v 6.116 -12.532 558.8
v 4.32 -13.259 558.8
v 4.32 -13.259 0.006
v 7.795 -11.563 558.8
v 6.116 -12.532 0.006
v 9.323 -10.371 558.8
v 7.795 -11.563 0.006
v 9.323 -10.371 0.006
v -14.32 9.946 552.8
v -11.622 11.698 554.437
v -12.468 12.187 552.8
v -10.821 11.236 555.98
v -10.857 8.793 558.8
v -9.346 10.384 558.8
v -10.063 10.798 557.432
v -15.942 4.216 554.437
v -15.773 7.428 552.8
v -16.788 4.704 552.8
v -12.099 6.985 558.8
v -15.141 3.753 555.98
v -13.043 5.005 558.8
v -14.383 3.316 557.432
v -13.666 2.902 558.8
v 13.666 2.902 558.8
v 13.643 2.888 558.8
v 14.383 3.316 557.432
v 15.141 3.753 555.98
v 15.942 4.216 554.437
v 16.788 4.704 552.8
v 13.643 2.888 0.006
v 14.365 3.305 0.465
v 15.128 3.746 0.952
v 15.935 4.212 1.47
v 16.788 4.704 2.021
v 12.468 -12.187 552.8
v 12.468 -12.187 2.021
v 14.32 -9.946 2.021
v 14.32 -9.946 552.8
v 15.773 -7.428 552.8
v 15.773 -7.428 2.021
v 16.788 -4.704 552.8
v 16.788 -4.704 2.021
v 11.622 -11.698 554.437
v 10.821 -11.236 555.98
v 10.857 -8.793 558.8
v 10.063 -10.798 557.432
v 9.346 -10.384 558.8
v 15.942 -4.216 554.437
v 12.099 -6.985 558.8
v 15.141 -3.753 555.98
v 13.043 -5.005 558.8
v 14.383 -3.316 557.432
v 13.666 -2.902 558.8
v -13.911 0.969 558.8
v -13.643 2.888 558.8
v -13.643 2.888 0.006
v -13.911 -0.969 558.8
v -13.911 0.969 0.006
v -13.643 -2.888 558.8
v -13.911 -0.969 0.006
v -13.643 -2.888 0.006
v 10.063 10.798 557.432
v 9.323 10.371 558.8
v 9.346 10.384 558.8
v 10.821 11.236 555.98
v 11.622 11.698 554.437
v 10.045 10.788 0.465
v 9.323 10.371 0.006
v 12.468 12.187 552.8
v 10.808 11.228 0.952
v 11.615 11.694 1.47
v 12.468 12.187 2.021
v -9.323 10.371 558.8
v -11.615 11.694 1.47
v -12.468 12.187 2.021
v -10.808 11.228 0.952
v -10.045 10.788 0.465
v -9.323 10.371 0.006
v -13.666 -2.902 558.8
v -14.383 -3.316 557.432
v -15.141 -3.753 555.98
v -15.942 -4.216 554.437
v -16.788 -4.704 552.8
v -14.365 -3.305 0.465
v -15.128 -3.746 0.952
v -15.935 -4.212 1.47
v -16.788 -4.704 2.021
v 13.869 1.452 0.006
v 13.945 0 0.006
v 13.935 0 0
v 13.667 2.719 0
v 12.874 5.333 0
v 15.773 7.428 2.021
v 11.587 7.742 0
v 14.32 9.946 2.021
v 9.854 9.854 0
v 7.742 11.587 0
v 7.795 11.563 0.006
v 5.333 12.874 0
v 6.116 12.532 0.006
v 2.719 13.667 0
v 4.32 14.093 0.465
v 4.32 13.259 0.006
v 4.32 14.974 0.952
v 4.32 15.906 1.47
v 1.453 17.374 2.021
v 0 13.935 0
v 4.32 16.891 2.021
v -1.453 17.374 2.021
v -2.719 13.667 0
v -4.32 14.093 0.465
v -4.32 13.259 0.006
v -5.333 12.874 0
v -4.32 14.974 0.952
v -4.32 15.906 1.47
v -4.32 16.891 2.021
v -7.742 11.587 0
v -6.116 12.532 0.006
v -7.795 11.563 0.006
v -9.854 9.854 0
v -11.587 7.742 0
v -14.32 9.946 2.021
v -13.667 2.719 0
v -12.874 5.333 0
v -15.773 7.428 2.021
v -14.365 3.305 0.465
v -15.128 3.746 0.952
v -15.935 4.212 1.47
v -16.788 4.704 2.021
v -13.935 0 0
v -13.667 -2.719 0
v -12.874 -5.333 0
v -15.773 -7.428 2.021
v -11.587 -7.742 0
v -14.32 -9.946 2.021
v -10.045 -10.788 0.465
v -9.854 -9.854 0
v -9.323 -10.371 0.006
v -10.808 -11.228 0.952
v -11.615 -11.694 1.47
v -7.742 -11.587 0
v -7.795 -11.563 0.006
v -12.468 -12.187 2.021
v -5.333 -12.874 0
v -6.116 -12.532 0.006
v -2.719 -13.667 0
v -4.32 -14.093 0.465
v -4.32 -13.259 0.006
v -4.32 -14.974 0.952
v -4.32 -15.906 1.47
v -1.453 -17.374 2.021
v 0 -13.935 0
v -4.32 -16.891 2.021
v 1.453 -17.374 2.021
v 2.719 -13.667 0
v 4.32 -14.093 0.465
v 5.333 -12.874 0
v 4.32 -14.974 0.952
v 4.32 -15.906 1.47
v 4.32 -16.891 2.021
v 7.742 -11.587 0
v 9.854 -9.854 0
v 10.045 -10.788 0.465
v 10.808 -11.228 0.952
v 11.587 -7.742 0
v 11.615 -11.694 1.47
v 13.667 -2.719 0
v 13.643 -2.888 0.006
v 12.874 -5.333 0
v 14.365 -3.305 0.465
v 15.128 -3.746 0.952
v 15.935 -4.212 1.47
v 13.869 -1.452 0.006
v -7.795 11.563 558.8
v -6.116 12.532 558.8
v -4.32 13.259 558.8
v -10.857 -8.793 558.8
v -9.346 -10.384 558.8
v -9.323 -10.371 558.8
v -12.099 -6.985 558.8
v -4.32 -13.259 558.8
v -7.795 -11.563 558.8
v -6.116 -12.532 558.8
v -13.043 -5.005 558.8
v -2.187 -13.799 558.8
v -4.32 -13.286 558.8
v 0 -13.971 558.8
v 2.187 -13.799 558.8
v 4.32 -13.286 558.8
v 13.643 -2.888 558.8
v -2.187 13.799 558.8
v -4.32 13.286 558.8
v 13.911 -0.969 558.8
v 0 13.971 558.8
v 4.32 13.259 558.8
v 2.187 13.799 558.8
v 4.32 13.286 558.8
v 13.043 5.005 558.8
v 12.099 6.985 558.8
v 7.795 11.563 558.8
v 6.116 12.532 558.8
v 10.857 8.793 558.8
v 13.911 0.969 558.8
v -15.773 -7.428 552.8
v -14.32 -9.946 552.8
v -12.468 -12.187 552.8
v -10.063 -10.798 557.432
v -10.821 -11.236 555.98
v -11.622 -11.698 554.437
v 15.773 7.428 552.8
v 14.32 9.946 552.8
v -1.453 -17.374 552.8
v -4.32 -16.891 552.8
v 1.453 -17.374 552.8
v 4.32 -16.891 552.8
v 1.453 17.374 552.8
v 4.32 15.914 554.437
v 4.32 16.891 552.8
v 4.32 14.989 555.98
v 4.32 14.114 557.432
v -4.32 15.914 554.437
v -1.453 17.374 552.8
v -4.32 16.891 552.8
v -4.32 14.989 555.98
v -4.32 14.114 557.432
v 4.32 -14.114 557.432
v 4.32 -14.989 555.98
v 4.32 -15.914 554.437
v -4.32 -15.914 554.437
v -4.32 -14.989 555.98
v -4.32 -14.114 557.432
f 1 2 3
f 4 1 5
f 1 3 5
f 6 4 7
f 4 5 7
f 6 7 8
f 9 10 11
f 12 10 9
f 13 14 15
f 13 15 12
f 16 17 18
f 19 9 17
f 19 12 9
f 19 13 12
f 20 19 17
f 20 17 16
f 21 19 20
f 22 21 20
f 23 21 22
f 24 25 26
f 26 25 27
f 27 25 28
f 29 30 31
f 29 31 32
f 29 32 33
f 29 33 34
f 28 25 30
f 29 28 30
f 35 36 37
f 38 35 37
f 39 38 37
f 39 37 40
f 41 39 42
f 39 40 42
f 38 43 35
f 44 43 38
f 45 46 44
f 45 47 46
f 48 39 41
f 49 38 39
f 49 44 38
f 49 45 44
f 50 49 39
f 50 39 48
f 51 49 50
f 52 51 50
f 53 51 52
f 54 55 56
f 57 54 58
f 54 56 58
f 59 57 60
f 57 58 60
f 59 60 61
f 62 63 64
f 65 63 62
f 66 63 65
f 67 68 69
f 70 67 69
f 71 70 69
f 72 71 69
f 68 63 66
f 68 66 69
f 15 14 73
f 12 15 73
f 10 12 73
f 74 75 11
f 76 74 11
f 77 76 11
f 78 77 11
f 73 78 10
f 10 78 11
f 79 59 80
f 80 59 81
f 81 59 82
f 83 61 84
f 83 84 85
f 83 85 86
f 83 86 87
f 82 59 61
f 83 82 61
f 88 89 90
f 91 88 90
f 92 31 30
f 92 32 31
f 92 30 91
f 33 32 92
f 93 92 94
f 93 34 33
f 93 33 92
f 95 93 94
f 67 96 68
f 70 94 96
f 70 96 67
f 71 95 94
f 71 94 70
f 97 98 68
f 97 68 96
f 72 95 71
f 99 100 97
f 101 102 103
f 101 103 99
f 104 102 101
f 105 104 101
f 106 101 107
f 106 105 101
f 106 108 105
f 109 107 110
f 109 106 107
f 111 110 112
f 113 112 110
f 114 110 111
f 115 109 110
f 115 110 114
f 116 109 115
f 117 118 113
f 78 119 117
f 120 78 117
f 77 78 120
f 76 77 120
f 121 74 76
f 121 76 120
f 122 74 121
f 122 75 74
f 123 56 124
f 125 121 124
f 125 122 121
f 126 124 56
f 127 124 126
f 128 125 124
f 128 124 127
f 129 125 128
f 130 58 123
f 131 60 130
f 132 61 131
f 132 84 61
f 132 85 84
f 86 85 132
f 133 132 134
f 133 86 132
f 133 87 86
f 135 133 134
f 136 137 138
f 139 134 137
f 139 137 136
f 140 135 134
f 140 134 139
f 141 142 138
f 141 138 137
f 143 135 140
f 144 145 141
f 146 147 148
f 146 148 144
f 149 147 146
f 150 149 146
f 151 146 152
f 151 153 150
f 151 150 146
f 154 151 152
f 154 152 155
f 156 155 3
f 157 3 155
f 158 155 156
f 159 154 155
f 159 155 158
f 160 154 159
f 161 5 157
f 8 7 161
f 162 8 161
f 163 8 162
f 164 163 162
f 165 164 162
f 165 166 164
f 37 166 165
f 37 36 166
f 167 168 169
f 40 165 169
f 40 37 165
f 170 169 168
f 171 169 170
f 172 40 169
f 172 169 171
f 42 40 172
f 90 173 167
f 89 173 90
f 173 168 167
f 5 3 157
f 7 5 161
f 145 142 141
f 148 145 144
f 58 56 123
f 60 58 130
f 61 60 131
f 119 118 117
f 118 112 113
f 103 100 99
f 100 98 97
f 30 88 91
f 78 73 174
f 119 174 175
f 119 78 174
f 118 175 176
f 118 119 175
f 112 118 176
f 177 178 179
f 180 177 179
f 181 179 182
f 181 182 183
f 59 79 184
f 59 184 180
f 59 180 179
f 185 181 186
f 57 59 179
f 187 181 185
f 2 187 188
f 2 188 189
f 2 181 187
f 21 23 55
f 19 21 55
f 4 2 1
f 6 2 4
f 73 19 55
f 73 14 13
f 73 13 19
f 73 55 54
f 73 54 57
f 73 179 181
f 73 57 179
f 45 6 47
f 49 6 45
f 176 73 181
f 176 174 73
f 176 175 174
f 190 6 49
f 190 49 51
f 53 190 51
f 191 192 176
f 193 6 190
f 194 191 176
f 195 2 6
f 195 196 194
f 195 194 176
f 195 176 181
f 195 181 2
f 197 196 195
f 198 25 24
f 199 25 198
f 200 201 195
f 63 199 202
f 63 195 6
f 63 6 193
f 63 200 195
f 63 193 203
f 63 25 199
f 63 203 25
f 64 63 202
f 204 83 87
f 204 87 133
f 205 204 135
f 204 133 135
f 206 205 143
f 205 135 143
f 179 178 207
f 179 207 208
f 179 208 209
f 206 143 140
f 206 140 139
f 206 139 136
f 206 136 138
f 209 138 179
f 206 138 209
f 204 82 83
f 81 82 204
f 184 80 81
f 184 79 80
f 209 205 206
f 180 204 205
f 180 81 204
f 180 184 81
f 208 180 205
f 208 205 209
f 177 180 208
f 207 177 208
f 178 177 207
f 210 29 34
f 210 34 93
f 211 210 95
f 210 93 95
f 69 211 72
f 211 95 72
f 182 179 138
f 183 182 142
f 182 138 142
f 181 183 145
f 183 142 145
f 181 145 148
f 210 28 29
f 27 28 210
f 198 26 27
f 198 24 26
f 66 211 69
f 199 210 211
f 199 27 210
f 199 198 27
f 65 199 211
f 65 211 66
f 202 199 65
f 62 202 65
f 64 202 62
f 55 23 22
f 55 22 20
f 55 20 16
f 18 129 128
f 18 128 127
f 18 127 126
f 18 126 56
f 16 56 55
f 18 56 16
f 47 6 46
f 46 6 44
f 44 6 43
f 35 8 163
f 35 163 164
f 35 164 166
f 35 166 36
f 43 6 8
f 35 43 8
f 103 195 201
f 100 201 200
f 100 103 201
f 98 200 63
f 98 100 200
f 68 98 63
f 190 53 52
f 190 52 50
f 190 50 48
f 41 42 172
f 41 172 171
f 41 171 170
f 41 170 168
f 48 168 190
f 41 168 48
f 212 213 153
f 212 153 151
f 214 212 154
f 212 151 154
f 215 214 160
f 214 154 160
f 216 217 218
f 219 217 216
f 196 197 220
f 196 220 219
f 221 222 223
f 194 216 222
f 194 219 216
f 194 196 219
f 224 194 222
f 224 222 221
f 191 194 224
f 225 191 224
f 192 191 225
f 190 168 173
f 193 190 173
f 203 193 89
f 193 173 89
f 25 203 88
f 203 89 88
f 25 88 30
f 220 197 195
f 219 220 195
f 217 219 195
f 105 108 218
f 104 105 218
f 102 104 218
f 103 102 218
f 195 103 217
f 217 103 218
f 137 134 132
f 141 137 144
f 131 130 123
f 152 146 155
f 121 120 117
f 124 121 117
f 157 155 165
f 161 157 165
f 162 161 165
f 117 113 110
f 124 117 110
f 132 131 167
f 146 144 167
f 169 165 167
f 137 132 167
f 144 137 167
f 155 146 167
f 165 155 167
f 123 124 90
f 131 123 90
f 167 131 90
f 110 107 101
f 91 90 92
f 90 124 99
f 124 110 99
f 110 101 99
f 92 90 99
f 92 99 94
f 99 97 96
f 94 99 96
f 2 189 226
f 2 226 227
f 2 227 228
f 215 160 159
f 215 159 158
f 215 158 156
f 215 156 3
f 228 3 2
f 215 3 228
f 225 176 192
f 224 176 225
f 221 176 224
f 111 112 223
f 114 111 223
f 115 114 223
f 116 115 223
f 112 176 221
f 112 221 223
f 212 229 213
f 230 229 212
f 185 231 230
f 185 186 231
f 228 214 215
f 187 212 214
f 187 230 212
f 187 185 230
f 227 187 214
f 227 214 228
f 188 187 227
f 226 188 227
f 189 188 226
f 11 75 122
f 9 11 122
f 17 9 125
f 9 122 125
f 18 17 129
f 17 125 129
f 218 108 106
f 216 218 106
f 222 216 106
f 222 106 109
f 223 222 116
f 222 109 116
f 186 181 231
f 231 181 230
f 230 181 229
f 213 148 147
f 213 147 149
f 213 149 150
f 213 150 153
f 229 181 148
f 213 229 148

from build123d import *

# Parameters (mm, degrees)
SKETCH1_R           = 17.435
BOSS_EXTRUDE2_DEPTH = 558.8
CHAMFER2_SIZE       = 6
CHAMFER2_SIZE2      = 3.464101615
CHAMFER3_SIZE       = 3.5
CHAMFER3_SIZE2      = 2.020725942
CUT_EXTRUDE1_DEPTH  = 558.8


with BuildPart() as part:
    # Sketch1 → Boss-Extrude2 (new body)
    with BuildSketch(Plane.XY):
        Circle(SKETCH1_R)
    extrude(amount=BOSS_EXTRUDE2_DEPTH)

    # Chamfer2
    chamfer2_edges = [part.edges().sort_by_distance(p)[0] for p in [
        (-17.435, 0, 558.8),
    ]]
    chamfer2_side = [part.faces().sort_by_distance(p)[0] for p in [
        (-17.435, 0, 279.4),
    ]]
    chamfer(chamfer2_edges, length=CHAMFER2_SIZE, length2=CHAMFER2_SIZE2, reference=chamfer2_side[0])

    # Chamfer3
    chamfer3_edges = [part.edges().sort_by_distance(p)[0] for p in [
        (-17.435, 0, 0),
    ]]
    chamfer3_side = [part.faces().sort_by_distance(p)[0] for p in [
        (0, 0, 0),
    ]]
    chamfer(chamfer3_edges, length=CHAMFER3_SIZE, length2=CHAMFER3_SIZE2, reference=chamfer3_side[0])

    # Sketch3 → Cut-Extrude1 (cut)
    with BuildSketch(Plane(origin=(0, 0, 0), x_dir=(-1, 0, 0), z_dir=(0, 0, -1))):
        with BuildLine():
            Line((-4.32, 16.891323956), (-4.32, 13.258982804))
            ThreePointArc((-4.32, 13.258982804), (-6.9725, 12.076724256), (-9.322615937, 10.370721146))
            Line((-9.322615937, 10.370721146), (-12.46831565, 12.186891723))
            ThreePointArc((-12.46831565, 12.186891723), (-8.7175, 15.099152915), (-4.32, 16.891323956))
        make_face()
        with BuildLine():
            Line((12.46831565, 12.186891723), (9.322615937, 10.370721146))
            ThreePointArc((9.322615937, 10.370721146), (6.9725, 12.076724256), (4.32, 13.258982804))
            Line((4.32, 13.258982804), (4.32, 16.891323956))
            ThreePointArc((4.32, 16.891323956), (8.7175, 15.099152915), (12.46831565, 12.186891723))
        make_face()
        with BuildLine():
            Line((16.78831565, 4.704432234), (13.642615937, 2.888261658))
            ThreePointArc((13.642615937, 2.888261658), (13.945, 0), (13.642615937, -2.888261658))
            Line((13.642615937, -2.888261658), (16.78831565, -4.704432234))
            ThreePointArc((16.78831565, -4.704432234), (17.435, 0), (16.78831565, 4.704432234))
        make_face()
        with BuildLine():
            Line((12.46831565, -12.186891723), (9.322615937, -10.370721146))
            ThreePointArc((9.322615937, -10.370721146), (6.9725, -12.076724256), (4.32, -13.258982804))
            Line((4.32, -13.258982804), (4.32, -16.891323956))
            ThreePointArc((4.32, -16.891323956), (8.7175, -15.099152915), (12.46831565, -12.186891723))
        make_face()
        with BuildLine():
            Line((-4.32, -16.891323956), (-4.32, -13.258982804))
            ThreePointArc((-4.32, -13.258982804), (-6.9725, -12.076724256), (-9.322615937, -10.370721146))
            Line((-9.322615937, -10.370721146), (-12.46831565, -12.186891723))
            ThreePointArc((-12.46831565, -12.186891723), (-8.7175, -15.099152915), (-4.32, -16.891323956))
        make_face()
        with BuildLine():
            Line((-16.78831565, -4.704432234), (-13.642615937, -2.888261658))
            ThreePointArc((-13.642615937, -2.888261658), (-13.945, 0), (-13.642615937, 2.888261658))
            Line((-13.642615937, 2.888261658), (-16.78831565, 4.704432234))
            ThreePointArc((-16.78831565, 4.704432234), (-17.435, 0), (-16.78831565, -4.704432234))
        make_face()
    extrude(amount=-CUT_EXTRUDE1_DEPTH, mode=Mode.SUBTRACT)


solid = part.part
